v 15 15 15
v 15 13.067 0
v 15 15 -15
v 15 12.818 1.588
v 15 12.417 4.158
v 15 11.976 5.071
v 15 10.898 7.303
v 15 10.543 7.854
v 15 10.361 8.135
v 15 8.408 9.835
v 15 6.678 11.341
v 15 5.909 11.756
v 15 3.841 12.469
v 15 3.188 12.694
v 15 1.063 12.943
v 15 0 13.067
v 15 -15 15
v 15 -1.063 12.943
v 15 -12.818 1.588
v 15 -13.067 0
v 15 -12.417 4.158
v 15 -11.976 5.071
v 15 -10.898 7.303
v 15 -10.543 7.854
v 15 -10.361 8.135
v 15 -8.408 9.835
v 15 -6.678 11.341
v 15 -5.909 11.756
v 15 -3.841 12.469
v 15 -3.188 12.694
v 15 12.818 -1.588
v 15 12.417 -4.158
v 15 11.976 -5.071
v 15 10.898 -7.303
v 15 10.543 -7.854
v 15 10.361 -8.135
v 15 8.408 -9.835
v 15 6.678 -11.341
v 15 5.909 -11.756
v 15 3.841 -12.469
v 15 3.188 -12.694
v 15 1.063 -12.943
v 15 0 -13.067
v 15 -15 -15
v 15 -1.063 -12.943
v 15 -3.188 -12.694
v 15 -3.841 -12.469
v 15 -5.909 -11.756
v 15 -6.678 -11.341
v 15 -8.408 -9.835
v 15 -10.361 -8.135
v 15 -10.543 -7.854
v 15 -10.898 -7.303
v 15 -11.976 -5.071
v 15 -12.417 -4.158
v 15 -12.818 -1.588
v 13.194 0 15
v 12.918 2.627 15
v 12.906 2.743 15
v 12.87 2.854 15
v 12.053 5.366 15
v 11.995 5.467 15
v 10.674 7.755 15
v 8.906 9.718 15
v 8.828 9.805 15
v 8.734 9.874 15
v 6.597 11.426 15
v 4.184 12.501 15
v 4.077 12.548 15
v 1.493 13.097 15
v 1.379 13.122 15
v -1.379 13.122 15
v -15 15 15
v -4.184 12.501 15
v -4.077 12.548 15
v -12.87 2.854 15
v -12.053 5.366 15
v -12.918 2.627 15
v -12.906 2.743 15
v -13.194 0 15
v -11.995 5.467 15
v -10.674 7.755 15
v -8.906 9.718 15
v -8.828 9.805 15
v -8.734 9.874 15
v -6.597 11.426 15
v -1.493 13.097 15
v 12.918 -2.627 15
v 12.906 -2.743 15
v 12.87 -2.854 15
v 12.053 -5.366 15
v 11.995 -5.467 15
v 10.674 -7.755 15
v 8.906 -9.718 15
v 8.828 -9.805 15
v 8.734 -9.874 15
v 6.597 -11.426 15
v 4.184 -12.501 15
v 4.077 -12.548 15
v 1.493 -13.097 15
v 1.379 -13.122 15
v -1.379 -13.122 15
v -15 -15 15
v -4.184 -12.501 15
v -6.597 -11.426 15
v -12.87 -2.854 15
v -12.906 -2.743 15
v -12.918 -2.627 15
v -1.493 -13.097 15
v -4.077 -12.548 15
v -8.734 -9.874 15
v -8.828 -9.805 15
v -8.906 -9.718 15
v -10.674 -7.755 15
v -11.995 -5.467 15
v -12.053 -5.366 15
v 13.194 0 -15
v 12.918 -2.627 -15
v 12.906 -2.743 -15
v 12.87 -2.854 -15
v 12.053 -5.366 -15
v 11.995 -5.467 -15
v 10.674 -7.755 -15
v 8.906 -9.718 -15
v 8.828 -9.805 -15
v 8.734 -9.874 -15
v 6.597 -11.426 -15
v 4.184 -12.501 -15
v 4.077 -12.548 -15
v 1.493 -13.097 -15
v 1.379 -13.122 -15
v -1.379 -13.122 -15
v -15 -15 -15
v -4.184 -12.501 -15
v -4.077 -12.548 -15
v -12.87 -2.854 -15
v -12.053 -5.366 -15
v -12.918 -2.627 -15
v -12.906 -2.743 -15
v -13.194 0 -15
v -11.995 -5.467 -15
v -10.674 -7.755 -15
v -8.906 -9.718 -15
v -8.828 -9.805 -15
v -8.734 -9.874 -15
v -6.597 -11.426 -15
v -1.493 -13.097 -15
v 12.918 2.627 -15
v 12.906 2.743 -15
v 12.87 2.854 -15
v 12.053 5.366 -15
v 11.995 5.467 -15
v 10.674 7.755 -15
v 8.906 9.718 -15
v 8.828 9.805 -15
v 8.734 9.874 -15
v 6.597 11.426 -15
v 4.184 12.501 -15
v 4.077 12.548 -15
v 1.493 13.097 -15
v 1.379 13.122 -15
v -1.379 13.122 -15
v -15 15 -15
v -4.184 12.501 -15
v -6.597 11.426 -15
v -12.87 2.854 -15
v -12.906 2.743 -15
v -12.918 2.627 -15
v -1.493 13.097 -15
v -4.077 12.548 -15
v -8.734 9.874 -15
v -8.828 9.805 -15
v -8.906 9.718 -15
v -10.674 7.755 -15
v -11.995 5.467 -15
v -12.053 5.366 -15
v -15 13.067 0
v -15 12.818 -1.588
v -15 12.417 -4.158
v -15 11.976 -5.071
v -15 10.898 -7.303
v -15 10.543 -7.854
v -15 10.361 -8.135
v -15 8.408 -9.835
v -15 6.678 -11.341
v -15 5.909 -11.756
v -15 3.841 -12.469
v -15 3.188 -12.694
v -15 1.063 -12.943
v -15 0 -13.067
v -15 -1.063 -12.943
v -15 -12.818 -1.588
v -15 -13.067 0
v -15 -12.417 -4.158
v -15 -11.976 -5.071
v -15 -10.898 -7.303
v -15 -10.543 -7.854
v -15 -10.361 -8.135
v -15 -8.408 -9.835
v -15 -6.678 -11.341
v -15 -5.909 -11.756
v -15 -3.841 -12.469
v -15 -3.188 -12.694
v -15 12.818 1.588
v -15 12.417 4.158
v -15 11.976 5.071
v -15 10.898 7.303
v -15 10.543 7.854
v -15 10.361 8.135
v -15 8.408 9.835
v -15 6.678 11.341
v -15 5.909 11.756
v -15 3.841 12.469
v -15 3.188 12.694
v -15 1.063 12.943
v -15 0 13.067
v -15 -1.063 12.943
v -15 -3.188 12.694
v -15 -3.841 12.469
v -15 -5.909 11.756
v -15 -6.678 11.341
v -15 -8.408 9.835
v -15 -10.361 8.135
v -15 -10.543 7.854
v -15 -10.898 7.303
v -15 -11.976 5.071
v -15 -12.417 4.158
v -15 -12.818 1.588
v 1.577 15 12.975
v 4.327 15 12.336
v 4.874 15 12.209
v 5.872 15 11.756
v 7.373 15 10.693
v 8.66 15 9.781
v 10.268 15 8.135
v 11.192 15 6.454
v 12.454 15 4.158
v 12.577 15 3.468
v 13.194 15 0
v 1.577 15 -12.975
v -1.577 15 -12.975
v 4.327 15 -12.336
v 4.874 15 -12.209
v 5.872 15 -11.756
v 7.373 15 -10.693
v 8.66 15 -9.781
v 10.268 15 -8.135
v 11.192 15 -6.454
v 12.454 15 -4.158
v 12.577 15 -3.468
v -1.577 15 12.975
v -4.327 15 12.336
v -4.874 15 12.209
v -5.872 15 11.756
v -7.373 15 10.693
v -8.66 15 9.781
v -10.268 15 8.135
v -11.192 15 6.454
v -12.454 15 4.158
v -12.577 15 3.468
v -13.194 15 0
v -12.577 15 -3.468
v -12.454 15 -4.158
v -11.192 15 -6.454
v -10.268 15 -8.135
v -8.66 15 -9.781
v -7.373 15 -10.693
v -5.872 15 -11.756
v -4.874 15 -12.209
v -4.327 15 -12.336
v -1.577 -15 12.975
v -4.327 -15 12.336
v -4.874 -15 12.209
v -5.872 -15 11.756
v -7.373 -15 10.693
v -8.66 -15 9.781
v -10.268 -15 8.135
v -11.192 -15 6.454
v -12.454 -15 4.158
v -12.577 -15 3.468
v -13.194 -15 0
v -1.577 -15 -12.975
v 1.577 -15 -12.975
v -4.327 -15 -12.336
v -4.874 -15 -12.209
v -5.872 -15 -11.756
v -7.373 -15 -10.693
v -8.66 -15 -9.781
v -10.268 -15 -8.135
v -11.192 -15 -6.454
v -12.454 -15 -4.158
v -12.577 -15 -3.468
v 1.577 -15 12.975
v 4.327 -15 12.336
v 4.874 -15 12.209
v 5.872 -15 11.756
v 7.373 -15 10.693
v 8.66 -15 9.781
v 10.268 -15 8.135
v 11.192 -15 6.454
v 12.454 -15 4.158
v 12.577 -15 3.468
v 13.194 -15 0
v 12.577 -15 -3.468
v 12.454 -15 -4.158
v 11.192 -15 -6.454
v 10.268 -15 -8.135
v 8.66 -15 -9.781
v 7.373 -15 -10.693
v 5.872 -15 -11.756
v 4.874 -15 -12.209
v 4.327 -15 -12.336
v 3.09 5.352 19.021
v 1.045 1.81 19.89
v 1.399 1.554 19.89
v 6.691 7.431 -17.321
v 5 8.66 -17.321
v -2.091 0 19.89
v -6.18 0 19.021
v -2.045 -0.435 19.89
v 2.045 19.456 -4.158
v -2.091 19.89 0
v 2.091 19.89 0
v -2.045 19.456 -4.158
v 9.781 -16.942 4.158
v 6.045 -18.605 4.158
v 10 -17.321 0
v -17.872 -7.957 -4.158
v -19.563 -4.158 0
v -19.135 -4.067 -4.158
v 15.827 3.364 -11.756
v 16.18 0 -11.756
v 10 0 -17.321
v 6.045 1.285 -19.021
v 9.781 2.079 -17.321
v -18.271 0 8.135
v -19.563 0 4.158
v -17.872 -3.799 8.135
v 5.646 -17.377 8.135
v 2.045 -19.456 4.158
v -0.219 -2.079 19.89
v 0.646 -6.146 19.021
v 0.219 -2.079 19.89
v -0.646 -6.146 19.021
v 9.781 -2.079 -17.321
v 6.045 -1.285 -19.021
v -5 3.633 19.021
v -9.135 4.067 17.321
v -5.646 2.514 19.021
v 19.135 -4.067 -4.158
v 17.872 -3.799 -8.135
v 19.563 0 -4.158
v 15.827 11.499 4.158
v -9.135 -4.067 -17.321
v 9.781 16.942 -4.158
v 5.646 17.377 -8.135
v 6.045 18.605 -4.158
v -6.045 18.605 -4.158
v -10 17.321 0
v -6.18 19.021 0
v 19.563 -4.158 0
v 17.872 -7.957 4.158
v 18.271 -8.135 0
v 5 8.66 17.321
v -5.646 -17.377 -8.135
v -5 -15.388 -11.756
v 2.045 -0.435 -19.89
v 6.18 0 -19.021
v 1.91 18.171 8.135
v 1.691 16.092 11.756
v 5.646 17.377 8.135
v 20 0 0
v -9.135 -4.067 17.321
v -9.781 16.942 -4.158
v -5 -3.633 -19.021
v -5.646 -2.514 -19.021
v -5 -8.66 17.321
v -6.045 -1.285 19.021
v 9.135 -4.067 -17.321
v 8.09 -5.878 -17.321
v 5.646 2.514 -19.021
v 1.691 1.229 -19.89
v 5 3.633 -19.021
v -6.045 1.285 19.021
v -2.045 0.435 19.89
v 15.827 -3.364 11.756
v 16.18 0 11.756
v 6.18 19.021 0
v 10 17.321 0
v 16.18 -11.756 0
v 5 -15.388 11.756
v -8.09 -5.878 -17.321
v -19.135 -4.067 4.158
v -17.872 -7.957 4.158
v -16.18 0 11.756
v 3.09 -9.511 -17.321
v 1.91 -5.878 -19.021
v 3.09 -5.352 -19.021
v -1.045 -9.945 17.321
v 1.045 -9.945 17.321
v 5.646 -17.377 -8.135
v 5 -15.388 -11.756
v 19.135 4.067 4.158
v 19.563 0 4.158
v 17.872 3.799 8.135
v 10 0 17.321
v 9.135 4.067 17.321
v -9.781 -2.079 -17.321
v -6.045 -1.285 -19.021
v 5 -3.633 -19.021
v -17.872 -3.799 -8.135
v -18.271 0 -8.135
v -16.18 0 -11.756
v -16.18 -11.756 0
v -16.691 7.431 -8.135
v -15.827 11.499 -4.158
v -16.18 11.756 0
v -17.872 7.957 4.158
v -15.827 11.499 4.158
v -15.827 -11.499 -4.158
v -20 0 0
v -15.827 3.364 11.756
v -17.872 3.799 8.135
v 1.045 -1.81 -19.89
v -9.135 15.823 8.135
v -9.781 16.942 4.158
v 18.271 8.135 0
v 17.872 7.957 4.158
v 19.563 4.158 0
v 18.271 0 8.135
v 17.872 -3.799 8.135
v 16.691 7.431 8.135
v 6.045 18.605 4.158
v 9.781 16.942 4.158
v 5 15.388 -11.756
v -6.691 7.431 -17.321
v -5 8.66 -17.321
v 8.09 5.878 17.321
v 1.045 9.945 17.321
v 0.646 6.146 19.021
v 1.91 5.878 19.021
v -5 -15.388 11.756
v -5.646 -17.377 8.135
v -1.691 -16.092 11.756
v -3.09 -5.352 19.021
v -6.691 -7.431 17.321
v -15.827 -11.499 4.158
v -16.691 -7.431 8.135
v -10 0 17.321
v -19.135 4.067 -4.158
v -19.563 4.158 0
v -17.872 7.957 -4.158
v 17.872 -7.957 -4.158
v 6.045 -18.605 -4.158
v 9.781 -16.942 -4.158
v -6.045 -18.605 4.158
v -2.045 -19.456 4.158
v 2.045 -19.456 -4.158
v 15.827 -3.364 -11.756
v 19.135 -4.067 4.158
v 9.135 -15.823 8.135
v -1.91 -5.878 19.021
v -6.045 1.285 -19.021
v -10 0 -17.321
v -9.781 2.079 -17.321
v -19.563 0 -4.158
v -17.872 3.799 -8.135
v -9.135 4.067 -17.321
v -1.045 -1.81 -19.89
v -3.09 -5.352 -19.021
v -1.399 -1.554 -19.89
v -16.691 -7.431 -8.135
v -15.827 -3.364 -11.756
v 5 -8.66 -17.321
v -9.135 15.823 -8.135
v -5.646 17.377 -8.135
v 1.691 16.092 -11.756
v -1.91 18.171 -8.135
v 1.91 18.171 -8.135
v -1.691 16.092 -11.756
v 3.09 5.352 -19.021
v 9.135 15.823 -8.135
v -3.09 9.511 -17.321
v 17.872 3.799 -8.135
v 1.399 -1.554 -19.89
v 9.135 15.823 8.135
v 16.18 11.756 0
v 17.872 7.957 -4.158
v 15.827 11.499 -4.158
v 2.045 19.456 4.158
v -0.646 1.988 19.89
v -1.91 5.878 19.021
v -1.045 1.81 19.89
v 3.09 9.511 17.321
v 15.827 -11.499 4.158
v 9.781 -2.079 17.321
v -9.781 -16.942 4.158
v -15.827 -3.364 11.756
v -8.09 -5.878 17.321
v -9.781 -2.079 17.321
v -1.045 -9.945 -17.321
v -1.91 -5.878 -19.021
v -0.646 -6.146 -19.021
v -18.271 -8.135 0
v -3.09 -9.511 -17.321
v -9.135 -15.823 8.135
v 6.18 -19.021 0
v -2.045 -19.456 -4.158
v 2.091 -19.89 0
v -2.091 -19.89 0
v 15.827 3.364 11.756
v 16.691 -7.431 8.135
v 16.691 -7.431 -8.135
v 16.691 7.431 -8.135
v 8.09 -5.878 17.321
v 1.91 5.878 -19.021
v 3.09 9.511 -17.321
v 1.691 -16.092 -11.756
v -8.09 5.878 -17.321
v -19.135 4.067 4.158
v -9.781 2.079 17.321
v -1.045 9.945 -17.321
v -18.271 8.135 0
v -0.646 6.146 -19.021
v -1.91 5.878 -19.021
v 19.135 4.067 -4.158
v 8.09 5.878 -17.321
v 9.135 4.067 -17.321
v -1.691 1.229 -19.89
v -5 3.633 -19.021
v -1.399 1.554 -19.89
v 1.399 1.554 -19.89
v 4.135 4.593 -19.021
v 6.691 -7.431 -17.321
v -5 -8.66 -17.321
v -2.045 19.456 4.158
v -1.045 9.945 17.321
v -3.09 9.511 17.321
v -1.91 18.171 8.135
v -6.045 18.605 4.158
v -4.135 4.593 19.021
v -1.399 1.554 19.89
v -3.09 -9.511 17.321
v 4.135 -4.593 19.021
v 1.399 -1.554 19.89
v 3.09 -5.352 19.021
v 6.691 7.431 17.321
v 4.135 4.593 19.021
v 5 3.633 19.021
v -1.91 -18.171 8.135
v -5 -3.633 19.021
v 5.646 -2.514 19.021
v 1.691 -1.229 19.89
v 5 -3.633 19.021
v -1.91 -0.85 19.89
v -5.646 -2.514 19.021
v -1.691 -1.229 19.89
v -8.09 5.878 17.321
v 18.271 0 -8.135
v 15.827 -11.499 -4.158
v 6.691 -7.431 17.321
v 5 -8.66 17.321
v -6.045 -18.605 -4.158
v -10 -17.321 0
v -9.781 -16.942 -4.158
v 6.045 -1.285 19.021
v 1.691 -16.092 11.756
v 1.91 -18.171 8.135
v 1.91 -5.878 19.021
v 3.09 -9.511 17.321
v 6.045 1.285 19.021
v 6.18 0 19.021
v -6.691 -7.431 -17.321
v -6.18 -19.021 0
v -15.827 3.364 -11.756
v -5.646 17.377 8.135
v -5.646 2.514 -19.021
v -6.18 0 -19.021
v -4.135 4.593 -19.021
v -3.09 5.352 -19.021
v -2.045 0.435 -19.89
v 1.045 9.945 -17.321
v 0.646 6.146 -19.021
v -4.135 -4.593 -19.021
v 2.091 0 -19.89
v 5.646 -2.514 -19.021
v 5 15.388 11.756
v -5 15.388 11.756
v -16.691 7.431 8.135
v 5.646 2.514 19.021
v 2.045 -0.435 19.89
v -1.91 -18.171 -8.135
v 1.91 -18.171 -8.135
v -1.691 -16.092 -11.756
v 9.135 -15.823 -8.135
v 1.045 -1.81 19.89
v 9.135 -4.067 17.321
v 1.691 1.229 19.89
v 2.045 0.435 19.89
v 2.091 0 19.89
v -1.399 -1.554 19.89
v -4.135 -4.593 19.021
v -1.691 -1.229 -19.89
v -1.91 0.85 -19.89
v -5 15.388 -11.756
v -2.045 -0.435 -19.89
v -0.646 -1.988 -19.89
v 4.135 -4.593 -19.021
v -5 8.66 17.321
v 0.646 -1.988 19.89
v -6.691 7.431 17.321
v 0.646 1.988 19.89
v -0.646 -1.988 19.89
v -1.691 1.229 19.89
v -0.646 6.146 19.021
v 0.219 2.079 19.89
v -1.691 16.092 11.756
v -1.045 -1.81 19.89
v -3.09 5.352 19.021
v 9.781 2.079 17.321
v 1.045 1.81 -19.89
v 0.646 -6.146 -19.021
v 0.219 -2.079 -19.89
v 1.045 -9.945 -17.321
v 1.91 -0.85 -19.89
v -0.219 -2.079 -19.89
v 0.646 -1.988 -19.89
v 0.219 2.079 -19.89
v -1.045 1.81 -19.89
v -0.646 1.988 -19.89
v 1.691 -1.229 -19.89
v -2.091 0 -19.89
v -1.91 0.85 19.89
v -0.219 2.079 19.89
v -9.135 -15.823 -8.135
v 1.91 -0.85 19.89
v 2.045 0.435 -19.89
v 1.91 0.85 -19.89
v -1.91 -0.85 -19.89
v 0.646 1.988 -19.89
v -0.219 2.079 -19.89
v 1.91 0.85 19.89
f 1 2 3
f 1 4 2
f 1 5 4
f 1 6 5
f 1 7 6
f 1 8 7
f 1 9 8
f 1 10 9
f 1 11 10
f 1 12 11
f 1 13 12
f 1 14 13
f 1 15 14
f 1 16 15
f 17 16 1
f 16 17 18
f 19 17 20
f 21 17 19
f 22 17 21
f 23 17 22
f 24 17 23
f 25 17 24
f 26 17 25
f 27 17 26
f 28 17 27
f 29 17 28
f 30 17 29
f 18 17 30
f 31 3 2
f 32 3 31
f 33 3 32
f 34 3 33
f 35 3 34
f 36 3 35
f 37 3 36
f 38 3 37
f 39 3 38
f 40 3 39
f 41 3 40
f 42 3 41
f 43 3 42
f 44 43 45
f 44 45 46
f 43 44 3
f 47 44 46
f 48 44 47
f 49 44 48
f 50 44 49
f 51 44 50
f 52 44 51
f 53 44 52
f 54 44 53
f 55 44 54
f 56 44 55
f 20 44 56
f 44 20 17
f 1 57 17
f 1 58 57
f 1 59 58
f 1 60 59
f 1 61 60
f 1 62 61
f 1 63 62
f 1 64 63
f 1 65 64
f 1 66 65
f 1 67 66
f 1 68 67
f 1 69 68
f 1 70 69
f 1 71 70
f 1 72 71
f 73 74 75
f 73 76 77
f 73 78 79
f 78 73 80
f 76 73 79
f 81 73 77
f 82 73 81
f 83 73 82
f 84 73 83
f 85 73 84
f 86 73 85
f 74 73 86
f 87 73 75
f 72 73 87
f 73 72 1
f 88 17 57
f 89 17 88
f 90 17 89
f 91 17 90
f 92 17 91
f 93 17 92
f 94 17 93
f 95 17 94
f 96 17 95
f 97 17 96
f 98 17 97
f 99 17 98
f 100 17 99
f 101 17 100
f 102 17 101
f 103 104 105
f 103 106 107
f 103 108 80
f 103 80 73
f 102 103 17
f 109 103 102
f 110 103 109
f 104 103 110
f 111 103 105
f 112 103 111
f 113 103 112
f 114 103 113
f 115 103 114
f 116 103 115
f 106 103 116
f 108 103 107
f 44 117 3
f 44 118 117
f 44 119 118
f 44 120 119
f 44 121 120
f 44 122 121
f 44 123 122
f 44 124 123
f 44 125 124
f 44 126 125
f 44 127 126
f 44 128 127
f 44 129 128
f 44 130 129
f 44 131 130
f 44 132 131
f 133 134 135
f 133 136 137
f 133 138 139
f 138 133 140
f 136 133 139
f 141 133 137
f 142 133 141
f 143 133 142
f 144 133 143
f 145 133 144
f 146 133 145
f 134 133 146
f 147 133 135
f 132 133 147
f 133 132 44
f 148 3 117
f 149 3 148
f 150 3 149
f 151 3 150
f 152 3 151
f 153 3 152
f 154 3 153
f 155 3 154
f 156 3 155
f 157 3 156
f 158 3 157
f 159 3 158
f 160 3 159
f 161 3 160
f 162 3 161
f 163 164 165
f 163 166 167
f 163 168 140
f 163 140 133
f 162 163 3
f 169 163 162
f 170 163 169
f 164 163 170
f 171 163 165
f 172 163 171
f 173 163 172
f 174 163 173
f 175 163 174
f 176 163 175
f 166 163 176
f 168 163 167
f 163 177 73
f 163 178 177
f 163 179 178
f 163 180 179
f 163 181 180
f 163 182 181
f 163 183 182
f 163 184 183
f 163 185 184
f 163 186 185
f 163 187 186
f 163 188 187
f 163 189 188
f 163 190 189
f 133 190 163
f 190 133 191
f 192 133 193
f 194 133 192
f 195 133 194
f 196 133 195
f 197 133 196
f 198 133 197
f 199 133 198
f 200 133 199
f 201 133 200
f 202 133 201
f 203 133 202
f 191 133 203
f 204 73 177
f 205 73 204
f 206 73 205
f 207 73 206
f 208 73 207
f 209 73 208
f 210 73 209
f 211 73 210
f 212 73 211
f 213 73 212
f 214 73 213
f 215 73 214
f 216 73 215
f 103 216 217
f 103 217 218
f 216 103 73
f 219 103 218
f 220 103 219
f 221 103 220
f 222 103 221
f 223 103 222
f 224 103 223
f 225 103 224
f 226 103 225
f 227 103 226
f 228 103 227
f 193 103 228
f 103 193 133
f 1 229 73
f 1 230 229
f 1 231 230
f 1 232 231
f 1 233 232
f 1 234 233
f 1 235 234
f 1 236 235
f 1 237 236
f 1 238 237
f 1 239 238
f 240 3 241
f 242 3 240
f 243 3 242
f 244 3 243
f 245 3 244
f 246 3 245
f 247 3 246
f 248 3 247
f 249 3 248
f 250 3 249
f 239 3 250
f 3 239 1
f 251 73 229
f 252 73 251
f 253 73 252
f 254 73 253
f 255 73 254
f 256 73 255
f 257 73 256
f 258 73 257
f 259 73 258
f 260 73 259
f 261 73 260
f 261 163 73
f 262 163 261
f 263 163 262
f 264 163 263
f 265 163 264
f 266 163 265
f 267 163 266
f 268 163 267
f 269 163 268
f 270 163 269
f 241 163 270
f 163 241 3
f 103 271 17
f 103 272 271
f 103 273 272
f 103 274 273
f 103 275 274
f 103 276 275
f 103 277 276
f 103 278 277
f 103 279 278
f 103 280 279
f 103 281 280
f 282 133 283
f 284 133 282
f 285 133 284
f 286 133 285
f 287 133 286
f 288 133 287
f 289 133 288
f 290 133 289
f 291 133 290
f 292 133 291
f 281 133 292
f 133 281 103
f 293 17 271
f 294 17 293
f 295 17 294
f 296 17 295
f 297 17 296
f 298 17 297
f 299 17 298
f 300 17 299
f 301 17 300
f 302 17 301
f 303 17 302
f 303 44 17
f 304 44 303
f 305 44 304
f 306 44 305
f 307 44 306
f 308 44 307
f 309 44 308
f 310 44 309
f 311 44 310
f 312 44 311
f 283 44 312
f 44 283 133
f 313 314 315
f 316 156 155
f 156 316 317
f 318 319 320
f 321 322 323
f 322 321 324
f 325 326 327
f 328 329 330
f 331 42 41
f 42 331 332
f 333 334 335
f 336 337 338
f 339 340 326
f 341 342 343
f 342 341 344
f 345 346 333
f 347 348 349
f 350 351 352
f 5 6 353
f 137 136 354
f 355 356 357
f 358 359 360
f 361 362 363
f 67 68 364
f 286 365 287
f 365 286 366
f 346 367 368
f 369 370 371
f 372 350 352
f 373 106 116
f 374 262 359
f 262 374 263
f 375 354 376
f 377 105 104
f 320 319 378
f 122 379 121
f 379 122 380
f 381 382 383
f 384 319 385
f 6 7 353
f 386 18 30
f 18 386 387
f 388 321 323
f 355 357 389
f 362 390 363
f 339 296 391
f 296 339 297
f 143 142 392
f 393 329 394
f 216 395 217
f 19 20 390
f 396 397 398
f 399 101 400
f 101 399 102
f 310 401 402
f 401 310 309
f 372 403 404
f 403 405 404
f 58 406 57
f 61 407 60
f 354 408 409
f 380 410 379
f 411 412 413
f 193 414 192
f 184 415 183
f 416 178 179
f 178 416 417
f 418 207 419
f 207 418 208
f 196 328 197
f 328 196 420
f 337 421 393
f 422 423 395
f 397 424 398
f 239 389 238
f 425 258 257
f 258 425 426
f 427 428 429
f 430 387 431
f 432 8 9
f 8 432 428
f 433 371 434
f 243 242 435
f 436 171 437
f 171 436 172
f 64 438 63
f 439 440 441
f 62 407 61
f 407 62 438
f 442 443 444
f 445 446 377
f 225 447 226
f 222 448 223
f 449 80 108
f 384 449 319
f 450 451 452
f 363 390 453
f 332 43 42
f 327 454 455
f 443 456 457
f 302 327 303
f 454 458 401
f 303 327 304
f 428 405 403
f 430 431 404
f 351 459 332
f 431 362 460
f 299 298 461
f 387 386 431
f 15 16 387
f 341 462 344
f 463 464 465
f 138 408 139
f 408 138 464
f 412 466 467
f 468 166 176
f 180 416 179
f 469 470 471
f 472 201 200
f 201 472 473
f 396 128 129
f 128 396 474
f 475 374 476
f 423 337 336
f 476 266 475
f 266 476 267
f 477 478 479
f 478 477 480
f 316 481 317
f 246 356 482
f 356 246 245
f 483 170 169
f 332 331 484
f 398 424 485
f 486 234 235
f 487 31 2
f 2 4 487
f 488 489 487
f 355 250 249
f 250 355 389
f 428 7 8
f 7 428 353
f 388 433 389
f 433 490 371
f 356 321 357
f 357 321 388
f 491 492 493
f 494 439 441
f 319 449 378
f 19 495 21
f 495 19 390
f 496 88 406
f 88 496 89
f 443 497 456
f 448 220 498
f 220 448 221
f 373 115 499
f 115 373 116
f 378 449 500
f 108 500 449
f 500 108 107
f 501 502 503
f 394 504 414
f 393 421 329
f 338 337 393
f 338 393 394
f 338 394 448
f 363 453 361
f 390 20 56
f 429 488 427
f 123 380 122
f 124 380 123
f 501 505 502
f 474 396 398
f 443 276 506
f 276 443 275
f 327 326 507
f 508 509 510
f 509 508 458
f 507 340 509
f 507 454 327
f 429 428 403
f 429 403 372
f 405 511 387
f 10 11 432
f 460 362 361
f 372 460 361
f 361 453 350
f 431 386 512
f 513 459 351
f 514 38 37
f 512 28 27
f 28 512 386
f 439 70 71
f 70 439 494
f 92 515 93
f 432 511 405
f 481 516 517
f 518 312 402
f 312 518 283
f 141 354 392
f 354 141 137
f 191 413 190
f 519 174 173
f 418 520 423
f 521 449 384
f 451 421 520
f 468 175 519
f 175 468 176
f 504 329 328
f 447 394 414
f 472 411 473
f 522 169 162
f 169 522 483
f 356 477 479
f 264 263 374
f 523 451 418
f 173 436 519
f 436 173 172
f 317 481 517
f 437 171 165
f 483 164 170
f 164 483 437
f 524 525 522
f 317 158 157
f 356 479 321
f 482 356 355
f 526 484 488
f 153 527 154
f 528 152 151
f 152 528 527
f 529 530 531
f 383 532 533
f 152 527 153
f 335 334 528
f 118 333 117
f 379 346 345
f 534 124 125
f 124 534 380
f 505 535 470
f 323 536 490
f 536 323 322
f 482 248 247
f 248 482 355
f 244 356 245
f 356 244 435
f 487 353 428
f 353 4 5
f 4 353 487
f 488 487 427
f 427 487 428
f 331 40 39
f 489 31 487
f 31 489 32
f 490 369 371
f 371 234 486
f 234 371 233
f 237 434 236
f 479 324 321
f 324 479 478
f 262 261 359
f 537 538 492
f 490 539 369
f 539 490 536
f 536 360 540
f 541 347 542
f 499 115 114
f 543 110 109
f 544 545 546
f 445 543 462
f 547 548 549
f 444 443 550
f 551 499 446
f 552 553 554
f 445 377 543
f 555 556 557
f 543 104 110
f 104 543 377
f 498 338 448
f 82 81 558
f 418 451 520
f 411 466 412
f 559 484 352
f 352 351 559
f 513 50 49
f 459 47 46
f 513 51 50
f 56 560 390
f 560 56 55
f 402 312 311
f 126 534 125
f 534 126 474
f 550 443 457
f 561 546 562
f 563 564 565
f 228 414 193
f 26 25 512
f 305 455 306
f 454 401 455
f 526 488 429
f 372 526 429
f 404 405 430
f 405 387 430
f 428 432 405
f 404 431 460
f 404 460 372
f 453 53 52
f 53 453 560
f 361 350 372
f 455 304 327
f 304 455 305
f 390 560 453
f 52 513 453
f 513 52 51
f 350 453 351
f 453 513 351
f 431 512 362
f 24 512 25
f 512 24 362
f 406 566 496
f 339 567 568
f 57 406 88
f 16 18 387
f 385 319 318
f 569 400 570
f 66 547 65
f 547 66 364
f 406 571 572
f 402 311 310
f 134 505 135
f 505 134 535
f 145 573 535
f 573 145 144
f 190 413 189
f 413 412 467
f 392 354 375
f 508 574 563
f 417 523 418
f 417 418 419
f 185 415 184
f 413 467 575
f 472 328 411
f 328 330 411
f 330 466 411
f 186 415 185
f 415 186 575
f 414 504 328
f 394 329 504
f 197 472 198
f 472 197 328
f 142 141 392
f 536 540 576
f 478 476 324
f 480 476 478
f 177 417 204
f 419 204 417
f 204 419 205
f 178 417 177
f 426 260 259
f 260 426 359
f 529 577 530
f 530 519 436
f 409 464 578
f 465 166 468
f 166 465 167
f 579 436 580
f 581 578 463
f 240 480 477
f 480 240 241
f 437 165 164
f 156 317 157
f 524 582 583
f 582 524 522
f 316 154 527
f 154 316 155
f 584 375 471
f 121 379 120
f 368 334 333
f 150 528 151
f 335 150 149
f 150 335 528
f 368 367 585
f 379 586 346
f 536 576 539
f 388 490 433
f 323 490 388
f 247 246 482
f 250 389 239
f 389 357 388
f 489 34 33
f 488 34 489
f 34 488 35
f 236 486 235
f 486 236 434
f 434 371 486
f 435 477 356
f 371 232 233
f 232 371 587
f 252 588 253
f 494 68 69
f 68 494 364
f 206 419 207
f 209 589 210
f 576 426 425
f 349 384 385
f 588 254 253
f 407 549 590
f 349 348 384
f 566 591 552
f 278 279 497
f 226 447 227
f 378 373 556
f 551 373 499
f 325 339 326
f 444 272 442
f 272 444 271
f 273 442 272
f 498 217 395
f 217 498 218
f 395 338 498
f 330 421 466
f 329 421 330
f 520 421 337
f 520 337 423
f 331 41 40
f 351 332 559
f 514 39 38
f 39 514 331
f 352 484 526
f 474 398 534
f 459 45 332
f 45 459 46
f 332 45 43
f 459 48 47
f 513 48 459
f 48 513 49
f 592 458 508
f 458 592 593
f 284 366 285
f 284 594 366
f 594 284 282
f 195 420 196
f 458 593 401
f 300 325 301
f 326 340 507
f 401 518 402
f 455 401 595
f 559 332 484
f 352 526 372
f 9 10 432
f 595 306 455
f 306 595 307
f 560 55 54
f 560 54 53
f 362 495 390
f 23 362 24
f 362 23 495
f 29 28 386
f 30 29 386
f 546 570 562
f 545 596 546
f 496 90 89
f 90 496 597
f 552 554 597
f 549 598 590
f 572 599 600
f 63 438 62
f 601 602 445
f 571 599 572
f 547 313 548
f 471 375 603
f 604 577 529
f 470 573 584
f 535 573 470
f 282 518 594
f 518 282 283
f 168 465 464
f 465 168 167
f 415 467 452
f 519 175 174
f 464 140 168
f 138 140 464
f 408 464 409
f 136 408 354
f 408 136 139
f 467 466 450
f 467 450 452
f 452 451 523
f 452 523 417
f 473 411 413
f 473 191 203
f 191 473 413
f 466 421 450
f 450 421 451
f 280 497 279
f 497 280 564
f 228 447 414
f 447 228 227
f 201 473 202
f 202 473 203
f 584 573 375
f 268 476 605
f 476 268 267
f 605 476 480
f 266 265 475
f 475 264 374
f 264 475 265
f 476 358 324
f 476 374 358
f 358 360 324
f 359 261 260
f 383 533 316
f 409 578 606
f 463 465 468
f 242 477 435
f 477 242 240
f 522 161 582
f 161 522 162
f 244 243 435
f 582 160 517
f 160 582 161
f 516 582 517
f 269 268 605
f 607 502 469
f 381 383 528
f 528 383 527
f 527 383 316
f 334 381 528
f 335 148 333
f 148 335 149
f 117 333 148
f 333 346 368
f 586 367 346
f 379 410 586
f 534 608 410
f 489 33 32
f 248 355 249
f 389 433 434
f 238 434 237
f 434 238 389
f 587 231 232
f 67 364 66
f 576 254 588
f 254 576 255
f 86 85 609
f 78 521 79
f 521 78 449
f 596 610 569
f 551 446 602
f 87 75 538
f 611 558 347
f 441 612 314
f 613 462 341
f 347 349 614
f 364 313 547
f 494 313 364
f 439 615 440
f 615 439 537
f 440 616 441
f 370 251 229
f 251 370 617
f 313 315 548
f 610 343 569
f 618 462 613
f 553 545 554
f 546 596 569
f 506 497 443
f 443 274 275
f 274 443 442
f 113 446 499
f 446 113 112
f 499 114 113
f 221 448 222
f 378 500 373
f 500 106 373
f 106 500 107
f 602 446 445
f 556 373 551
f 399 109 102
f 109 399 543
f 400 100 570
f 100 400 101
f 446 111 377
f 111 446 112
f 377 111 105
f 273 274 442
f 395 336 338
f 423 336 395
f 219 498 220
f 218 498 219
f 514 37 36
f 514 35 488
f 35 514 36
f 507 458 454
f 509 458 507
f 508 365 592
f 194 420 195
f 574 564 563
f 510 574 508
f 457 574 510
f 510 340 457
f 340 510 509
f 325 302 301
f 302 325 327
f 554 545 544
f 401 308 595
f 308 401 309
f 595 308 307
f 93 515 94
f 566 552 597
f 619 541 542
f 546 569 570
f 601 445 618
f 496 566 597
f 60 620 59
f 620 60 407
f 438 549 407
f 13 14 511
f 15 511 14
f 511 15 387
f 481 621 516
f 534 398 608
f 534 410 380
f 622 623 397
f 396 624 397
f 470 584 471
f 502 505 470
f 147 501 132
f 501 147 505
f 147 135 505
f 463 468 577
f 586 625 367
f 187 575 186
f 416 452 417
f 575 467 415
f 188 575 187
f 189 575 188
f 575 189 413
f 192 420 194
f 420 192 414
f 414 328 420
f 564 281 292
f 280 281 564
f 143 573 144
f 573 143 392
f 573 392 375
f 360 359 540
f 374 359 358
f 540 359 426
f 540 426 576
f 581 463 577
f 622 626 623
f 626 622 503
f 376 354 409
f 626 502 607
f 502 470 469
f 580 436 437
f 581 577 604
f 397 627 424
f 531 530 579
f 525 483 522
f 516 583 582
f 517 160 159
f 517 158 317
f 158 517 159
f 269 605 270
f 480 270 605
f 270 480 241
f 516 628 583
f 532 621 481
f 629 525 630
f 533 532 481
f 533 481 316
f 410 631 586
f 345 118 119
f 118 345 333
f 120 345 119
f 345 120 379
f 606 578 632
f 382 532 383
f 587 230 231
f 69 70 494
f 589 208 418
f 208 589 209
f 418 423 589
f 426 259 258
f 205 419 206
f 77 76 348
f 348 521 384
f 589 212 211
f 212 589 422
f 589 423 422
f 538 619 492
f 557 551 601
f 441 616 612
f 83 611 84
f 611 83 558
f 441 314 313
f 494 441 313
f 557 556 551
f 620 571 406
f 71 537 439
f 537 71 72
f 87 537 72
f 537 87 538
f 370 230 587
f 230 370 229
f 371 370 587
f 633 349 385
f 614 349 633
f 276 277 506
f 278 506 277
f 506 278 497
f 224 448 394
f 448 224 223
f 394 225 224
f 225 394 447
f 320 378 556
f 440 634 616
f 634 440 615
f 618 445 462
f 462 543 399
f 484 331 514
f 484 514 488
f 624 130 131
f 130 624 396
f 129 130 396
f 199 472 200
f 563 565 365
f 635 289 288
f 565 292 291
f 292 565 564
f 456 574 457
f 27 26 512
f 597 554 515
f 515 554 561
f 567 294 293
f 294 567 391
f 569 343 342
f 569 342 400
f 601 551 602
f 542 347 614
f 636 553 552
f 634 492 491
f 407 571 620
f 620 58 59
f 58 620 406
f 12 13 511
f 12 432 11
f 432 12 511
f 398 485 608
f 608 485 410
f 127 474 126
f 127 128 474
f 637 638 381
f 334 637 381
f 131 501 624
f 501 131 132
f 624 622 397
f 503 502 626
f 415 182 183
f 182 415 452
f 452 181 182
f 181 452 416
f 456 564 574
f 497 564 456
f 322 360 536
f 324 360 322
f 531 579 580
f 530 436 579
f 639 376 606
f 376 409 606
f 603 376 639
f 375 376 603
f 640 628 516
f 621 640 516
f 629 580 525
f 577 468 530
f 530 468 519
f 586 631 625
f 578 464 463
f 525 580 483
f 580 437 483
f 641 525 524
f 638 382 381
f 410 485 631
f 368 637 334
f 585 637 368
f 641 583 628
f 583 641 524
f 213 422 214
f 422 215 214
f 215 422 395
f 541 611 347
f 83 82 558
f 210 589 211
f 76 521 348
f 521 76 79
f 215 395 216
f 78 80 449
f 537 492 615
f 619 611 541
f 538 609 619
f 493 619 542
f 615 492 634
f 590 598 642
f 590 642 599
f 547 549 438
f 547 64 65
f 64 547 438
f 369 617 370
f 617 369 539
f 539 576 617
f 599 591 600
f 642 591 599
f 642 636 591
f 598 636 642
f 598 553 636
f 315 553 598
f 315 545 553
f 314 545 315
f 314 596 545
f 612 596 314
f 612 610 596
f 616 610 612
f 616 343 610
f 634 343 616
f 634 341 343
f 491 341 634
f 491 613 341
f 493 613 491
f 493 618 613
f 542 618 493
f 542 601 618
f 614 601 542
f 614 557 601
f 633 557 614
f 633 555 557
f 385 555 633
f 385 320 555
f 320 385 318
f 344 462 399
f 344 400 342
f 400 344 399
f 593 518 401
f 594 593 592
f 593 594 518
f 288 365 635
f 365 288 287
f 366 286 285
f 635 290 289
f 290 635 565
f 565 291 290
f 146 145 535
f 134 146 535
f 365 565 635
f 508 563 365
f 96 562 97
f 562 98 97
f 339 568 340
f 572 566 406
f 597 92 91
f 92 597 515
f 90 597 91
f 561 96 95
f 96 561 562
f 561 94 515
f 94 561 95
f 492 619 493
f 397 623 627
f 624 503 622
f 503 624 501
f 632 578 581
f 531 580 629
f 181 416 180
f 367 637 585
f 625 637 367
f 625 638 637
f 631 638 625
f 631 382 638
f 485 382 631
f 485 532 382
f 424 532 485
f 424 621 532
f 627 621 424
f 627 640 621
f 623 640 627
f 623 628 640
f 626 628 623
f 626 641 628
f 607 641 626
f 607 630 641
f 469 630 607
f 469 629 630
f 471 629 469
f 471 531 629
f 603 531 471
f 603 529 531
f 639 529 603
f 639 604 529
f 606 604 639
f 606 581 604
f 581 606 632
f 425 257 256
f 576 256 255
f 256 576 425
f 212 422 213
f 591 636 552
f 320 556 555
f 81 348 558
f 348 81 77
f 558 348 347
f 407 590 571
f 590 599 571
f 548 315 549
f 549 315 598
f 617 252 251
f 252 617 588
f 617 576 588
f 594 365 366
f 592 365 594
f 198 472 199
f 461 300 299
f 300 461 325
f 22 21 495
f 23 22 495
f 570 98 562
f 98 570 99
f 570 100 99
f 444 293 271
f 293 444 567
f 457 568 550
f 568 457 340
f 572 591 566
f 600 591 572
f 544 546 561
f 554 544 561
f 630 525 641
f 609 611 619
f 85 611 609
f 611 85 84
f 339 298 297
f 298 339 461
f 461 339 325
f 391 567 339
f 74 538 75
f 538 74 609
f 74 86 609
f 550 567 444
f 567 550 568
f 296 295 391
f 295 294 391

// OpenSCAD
// Zusammenfasssen

module Zusammenfassen() {
    union() {
        cube(30, center=true);
        sphere(20);
    }
}

module Differenz() {
    difference() {
        cube(30, center=true);
        sphere(20);
    }
}

module Schnittmenge() {
    intersection() {
        cube(30, center=true);
        sphere(20);
    }
}

!Zusammenfassen();
Differenz();
Schnittmenge();
